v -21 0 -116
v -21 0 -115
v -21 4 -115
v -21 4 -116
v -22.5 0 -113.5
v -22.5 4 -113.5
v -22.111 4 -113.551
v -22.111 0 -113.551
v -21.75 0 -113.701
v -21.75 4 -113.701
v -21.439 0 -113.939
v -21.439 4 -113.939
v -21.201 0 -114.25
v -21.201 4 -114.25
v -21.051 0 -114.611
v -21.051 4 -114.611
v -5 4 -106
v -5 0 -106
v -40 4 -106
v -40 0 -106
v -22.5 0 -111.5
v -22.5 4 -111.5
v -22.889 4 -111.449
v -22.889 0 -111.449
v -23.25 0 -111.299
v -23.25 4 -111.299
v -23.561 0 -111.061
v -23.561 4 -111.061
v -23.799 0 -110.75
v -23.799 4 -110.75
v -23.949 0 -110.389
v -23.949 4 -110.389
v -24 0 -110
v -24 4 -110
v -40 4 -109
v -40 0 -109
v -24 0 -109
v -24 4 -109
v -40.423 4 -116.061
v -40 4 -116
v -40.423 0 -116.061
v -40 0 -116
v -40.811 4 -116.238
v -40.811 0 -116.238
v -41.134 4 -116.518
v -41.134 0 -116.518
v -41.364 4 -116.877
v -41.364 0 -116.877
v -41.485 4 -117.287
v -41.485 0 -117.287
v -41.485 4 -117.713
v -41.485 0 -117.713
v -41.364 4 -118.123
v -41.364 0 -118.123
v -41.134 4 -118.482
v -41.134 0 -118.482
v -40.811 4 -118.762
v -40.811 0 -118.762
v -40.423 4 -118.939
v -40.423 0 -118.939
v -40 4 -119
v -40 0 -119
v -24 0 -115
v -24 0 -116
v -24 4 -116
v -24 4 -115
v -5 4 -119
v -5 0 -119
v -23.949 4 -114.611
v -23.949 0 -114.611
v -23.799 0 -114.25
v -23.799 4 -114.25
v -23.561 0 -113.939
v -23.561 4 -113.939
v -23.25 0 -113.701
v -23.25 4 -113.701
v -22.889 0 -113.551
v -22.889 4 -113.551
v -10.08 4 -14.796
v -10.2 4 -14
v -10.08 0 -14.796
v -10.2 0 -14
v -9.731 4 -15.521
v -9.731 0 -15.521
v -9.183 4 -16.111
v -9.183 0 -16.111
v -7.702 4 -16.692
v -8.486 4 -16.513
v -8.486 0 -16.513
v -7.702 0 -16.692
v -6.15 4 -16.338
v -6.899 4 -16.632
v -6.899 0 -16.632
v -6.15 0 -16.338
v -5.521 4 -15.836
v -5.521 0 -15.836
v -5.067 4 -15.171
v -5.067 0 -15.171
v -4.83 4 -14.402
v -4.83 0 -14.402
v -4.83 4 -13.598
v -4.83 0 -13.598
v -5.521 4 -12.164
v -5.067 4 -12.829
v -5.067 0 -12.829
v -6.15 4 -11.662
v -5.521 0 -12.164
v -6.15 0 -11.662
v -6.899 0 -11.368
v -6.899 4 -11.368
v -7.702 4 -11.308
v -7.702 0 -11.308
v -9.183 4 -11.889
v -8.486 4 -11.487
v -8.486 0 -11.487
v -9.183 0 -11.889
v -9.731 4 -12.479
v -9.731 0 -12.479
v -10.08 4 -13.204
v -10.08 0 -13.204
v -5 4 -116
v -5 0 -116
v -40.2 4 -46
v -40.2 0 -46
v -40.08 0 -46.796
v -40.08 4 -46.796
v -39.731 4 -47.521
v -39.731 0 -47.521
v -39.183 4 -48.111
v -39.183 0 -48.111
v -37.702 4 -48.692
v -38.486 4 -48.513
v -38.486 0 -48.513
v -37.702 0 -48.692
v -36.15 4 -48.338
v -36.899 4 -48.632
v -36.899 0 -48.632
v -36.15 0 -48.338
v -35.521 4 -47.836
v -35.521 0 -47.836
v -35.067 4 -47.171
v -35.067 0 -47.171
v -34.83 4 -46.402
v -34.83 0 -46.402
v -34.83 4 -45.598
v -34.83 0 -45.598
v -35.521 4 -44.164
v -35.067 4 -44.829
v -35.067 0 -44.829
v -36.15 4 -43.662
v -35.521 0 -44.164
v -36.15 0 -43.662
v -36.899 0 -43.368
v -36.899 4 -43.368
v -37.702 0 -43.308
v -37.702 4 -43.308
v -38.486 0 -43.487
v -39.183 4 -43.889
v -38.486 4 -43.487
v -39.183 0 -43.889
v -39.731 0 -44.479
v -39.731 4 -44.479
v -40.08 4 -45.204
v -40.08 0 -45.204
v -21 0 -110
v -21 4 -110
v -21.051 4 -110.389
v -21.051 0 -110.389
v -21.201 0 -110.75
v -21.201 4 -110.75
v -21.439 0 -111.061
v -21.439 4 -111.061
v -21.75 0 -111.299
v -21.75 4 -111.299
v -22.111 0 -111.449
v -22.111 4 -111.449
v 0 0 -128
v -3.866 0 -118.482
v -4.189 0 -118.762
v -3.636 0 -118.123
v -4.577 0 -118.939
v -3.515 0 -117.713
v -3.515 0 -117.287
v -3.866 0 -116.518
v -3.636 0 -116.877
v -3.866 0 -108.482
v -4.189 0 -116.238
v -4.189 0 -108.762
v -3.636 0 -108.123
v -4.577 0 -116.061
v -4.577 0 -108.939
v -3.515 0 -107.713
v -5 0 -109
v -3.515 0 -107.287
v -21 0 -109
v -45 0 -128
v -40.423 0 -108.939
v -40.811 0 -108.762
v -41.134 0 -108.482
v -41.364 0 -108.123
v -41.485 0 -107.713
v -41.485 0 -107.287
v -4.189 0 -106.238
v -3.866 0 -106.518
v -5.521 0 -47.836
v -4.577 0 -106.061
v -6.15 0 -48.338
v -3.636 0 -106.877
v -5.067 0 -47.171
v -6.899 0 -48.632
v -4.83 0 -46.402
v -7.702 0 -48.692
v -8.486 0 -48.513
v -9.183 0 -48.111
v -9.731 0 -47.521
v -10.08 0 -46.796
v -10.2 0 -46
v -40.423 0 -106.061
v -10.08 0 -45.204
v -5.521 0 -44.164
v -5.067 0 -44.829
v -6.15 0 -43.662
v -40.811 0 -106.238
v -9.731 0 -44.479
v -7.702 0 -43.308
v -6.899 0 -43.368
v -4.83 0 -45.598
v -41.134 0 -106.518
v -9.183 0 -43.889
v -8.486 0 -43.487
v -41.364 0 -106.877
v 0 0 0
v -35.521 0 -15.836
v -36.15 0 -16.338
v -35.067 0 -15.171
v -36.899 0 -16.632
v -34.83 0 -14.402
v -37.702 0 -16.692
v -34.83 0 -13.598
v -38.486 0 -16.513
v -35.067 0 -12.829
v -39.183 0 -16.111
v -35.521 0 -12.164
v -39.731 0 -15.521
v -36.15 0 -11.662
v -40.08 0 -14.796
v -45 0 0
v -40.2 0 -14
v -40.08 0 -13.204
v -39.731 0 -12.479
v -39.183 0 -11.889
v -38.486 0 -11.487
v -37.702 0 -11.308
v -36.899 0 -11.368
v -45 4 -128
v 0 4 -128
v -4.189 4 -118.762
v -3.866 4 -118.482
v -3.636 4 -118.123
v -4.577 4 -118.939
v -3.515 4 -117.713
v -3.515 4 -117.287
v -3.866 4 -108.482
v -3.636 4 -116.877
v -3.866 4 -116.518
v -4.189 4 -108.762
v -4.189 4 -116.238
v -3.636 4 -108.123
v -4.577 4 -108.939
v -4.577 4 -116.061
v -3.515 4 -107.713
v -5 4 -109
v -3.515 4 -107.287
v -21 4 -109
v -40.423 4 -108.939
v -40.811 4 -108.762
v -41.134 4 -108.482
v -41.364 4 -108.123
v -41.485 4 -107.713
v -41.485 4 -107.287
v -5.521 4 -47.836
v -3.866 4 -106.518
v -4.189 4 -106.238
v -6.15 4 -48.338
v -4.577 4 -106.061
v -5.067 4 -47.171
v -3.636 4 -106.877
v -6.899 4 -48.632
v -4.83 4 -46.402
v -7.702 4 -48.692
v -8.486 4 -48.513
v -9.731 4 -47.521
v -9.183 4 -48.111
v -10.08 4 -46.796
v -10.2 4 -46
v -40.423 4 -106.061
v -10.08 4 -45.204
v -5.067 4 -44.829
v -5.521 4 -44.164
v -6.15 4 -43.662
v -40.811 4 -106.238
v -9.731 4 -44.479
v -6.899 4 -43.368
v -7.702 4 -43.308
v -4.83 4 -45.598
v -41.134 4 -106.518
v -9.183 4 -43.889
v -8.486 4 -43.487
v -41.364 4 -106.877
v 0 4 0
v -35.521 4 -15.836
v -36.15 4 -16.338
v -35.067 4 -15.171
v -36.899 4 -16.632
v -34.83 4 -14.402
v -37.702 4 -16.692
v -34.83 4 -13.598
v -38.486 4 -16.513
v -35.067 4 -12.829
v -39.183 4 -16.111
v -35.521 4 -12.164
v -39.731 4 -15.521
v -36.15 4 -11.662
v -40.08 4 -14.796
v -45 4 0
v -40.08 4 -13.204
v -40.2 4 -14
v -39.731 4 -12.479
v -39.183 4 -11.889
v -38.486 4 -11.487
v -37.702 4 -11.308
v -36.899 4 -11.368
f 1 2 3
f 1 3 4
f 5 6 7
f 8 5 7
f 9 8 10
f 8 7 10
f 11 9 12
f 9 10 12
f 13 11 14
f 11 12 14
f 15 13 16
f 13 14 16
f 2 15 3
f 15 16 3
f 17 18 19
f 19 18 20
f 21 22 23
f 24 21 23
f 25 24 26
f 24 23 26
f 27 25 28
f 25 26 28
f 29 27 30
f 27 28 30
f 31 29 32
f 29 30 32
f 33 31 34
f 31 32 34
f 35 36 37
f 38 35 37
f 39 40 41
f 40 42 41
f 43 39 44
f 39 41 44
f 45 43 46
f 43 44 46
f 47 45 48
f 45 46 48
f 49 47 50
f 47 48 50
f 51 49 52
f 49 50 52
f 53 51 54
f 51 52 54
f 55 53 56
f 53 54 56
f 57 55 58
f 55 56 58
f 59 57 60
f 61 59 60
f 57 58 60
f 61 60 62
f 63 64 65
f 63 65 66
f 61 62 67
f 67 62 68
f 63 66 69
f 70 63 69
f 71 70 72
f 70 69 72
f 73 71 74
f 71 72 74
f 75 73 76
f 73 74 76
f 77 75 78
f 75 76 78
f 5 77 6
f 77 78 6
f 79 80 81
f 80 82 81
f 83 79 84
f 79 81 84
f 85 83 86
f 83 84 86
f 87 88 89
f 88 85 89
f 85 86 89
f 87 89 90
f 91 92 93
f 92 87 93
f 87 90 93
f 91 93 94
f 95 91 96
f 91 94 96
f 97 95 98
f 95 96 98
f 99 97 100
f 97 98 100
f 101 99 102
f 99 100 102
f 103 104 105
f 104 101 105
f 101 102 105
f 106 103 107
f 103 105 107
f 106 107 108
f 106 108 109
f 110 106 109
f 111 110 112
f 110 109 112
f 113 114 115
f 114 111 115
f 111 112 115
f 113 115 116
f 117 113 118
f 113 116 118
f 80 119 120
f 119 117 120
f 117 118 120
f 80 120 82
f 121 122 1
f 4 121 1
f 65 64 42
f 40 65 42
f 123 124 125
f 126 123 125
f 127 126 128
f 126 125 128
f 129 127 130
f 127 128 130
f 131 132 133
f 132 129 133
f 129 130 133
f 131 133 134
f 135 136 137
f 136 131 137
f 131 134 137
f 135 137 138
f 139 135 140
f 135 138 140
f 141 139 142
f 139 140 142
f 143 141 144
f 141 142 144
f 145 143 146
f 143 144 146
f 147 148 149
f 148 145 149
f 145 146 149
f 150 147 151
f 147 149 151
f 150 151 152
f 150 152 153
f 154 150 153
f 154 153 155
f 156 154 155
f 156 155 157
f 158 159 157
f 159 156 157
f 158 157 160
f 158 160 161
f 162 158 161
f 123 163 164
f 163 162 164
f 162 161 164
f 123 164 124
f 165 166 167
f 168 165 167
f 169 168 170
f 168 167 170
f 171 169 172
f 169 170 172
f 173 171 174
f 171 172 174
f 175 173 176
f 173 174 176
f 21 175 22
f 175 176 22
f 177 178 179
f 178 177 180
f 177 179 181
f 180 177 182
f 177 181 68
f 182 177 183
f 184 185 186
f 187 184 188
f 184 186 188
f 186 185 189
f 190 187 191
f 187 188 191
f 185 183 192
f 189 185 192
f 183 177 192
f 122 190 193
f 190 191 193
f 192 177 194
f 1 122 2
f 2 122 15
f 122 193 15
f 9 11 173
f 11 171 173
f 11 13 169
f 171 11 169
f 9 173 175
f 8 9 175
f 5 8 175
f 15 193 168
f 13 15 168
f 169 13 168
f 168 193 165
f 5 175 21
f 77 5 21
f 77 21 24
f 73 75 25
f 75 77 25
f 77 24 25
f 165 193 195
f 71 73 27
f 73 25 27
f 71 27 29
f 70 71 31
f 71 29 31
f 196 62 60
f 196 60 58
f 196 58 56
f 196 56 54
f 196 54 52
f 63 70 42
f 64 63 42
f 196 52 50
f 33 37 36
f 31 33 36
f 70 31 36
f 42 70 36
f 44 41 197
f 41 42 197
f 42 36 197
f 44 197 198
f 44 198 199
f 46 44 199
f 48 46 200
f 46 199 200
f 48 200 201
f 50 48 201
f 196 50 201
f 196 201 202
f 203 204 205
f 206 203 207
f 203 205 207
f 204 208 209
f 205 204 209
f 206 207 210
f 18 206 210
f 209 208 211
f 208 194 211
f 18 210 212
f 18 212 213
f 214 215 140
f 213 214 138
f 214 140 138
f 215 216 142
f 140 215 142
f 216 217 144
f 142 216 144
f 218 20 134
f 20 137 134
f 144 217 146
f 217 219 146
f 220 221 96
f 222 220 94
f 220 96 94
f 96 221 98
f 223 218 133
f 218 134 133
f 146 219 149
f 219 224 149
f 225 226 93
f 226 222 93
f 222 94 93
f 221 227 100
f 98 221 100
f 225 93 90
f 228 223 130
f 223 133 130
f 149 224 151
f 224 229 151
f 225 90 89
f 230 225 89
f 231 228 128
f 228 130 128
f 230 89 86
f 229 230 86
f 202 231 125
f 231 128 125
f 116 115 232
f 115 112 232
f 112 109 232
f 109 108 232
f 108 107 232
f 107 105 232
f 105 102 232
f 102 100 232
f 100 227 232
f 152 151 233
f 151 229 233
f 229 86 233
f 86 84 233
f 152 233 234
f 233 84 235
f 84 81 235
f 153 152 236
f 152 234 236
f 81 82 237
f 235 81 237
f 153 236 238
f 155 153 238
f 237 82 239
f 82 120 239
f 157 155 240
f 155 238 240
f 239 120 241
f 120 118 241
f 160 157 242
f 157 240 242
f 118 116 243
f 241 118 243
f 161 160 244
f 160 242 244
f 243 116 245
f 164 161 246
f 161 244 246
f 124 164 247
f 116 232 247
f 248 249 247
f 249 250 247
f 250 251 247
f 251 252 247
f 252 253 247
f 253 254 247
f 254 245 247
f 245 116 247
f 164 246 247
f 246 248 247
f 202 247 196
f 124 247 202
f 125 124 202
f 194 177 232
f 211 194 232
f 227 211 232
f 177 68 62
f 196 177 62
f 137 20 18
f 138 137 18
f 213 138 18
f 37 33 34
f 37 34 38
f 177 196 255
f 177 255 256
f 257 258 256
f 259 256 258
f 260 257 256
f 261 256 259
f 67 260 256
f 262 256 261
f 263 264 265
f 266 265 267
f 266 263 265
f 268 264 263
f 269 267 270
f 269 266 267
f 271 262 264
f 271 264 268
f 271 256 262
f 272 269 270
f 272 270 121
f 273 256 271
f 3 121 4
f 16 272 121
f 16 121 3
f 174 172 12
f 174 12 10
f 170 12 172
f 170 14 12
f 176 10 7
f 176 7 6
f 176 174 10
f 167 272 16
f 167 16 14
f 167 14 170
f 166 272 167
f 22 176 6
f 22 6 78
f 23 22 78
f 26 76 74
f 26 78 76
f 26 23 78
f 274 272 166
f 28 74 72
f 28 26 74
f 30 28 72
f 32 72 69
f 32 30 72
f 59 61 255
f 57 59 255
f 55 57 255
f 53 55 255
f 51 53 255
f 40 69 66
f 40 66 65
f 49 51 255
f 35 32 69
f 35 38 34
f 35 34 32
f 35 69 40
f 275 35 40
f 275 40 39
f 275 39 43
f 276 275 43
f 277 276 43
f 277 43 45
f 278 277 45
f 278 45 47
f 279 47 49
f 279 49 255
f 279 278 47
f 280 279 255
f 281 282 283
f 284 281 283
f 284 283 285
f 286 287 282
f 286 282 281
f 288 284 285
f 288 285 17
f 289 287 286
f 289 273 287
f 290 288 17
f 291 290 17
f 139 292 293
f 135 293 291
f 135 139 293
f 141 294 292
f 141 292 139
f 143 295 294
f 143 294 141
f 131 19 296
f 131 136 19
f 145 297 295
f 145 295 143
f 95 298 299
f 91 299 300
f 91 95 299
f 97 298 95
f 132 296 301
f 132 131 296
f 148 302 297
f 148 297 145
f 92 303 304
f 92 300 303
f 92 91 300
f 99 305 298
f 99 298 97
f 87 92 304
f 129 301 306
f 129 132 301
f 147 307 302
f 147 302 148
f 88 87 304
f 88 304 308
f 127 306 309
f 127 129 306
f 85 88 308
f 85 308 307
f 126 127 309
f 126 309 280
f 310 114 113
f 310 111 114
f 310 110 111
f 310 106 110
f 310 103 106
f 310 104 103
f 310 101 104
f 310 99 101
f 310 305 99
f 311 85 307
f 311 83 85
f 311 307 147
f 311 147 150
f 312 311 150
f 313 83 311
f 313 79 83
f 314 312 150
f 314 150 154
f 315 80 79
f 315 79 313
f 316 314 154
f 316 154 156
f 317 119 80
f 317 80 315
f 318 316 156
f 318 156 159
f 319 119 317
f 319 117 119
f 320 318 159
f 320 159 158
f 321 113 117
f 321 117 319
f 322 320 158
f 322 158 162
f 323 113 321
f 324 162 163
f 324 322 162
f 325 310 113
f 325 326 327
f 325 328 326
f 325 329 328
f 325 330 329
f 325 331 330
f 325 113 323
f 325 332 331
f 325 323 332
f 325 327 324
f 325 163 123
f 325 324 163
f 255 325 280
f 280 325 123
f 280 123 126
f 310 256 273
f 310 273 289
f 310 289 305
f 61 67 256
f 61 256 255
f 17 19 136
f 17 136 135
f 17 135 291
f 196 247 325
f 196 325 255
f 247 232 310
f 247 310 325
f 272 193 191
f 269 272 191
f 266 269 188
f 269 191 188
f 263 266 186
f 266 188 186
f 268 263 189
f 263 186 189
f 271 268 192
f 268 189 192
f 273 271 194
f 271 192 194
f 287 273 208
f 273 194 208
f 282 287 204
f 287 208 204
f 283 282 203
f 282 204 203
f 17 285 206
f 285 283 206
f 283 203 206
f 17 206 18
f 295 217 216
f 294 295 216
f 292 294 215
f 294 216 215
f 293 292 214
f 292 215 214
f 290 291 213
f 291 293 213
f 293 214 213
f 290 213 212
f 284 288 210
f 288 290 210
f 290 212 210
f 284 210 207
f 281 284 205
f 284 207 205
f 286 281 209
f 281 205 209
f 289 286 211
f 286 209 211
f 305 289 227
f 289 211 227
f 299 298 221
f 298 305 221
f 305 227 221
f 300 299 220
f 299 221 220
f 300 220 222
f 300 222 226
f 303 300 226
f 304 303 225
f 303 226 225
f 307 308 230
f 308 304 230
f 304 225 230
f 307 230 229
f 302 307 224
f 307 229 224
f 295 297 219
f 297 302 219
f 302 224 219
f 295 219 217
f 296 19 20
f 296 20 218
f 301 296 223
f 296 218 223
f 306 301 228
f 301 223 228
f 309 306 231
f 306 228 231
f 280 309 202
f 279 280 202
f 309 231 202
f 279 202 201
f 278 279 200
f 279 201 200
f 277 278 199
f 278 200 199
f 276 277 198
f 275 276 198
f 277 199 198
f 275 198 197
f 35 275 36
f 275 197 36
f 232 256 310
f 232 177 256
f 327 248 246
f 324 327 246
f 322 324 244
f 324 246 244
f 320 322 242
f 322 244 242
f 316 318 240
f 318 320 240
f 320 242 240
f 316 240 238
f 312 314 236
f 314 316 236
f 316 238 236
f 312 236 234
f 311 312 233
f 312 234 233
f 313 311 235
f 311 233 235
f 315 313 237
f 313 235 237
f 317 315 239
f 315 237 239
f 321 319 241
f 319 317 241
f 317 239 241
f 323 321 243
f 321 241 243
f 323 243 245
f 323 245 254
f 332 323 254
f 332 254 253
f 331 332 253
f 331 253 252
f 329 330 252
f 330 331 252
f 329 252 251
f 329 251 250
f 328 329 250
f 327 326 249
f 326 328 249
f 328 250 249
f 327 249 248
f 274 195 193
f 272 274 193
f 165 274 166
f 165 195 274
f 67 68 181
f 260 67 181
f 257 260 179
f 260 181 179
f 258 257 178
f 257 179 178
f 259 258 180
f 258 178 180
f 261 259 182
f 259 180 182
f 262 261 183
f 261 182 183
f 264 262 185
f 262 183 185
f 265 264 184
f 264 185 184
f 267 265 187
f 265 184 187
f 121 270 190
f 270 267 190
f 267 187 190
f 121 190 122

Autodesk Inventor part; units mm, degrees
ref_plane "YZ Plane" through (0, 0, 0) normal (1, 0, 0) x (0, 1, 0)
ref_plane "XZ Plane" through (0, 0, 0) normal (0, 1, 0) x (-1, 0, 0)
ref_plane "XY Plane" through (0, 0, 0) normal (0, 0, 1) x (1, 0, 0)
sketch "Sketch1" plane through (0, 0, 0) normal (0, 1, 0) x (-1, 0, 0)
  line L0 (0, 0) -> (45, 0)
  line L1 (45, 0) -> (45, -128)
  line L2 (45, -128) -> (0, -128)
  line L3 (0, -128) -> (0, 0)
  line L4 (37.5, -14) -> (7.5, -14) construction
  line L5 (7.5, -14) -> (7.5, -46) construction
  line L6 (7.5, -46) -> (37.5, -46) construction
  line L7 (37.5, -46) -> (37.5, -14) construction
  circle A0 centre (37.5, -46) radius 2.7
  circle A1 centre (37.5, -14) radius 2.7
  circle A2 centre (7.5, -14) radius 2.7
  circle A3 centre (7.5, -46) radius 2.7
  line L8 (22.5, -14) -> (22.5, 0) construction
  circle A4 centre (5, -107.5) radius 1.5
  circle A5 centre (40, -107.5) radius 1.5
  line L9 (40, -109) -> (5, -109)
  line L10 (5, -106) -> (40, -106)
  line L11 (21, -109) -> (21, -116)
  line L12 (24, -116) -> (24, -109)
  line L13 (22.5, -116) -> (22.5, -109) construction
  circle A6 centre (40, -117.5) radius 1.5
  line L14 (5, -116) -> (40, -116)
  line L15 (40, -119) -> (5, -119)
  circle A7 centre (5, -117.5) radius 1.5
  line L16 (17.5, -109) -> (17.5, -116)
  line L17 (27.5, -116) -> (27.5, -109)
  line L18 (22.5, -116) -> (22.5, -128) construction
  line L19 (21, -111.5) -> (24, -111.5)
  line L20 (24, -113.5) -> (21, -113.5)
  point P0 (25, -109)
  point P1 (25, -116)
  point P2 (15, -116)
  point P3 (15, -109)
  point P4 (21.5, -116)
  point P5 (18.5, -116)
  point P6 (22.5, -112.5)
  point P7 (22.5, -111.5)
  dimension "d0" = 128
  dimension "d1" = 45
  dimension "d2" = 30
  dimension "d3" = 32
  dimension "d4" = 5.4
  dimension "d5" = 14
  dimension "d6" = 3
  dimension "d7" = 35
  dimension "d8" = 7
  dimension "d9" = 3
  dimension "d10" = 35
  dimension "d11" = 5
  dimension "d12" = 5
  dimension "d13" = 12
  dimension "d16" = 3
  dimension "d17" = 1.5
  dimension "d18" = 2
  dimension "d19" = 1
extrude "Extrusion1" add sketch "Sketch1" along normal blind 4 contours L0 L1 L2 L3 | L9 L11 L14 L16 | L17 L14 L12 L9 | L19 L12 L20 L11
fillet "Fillet1" radius 1.5 4 edges at (-24, 2, -113.5) (-21, 2, -113.5) (-24, 2, -111.5) (-21, 2, -111.5)
equation "\"d12\" = d11"
equation "\"d17\" = 0.5 * d16"
equation "\"d19\" = 0.5 * d18"
properties part number "p2_3DPrint"
